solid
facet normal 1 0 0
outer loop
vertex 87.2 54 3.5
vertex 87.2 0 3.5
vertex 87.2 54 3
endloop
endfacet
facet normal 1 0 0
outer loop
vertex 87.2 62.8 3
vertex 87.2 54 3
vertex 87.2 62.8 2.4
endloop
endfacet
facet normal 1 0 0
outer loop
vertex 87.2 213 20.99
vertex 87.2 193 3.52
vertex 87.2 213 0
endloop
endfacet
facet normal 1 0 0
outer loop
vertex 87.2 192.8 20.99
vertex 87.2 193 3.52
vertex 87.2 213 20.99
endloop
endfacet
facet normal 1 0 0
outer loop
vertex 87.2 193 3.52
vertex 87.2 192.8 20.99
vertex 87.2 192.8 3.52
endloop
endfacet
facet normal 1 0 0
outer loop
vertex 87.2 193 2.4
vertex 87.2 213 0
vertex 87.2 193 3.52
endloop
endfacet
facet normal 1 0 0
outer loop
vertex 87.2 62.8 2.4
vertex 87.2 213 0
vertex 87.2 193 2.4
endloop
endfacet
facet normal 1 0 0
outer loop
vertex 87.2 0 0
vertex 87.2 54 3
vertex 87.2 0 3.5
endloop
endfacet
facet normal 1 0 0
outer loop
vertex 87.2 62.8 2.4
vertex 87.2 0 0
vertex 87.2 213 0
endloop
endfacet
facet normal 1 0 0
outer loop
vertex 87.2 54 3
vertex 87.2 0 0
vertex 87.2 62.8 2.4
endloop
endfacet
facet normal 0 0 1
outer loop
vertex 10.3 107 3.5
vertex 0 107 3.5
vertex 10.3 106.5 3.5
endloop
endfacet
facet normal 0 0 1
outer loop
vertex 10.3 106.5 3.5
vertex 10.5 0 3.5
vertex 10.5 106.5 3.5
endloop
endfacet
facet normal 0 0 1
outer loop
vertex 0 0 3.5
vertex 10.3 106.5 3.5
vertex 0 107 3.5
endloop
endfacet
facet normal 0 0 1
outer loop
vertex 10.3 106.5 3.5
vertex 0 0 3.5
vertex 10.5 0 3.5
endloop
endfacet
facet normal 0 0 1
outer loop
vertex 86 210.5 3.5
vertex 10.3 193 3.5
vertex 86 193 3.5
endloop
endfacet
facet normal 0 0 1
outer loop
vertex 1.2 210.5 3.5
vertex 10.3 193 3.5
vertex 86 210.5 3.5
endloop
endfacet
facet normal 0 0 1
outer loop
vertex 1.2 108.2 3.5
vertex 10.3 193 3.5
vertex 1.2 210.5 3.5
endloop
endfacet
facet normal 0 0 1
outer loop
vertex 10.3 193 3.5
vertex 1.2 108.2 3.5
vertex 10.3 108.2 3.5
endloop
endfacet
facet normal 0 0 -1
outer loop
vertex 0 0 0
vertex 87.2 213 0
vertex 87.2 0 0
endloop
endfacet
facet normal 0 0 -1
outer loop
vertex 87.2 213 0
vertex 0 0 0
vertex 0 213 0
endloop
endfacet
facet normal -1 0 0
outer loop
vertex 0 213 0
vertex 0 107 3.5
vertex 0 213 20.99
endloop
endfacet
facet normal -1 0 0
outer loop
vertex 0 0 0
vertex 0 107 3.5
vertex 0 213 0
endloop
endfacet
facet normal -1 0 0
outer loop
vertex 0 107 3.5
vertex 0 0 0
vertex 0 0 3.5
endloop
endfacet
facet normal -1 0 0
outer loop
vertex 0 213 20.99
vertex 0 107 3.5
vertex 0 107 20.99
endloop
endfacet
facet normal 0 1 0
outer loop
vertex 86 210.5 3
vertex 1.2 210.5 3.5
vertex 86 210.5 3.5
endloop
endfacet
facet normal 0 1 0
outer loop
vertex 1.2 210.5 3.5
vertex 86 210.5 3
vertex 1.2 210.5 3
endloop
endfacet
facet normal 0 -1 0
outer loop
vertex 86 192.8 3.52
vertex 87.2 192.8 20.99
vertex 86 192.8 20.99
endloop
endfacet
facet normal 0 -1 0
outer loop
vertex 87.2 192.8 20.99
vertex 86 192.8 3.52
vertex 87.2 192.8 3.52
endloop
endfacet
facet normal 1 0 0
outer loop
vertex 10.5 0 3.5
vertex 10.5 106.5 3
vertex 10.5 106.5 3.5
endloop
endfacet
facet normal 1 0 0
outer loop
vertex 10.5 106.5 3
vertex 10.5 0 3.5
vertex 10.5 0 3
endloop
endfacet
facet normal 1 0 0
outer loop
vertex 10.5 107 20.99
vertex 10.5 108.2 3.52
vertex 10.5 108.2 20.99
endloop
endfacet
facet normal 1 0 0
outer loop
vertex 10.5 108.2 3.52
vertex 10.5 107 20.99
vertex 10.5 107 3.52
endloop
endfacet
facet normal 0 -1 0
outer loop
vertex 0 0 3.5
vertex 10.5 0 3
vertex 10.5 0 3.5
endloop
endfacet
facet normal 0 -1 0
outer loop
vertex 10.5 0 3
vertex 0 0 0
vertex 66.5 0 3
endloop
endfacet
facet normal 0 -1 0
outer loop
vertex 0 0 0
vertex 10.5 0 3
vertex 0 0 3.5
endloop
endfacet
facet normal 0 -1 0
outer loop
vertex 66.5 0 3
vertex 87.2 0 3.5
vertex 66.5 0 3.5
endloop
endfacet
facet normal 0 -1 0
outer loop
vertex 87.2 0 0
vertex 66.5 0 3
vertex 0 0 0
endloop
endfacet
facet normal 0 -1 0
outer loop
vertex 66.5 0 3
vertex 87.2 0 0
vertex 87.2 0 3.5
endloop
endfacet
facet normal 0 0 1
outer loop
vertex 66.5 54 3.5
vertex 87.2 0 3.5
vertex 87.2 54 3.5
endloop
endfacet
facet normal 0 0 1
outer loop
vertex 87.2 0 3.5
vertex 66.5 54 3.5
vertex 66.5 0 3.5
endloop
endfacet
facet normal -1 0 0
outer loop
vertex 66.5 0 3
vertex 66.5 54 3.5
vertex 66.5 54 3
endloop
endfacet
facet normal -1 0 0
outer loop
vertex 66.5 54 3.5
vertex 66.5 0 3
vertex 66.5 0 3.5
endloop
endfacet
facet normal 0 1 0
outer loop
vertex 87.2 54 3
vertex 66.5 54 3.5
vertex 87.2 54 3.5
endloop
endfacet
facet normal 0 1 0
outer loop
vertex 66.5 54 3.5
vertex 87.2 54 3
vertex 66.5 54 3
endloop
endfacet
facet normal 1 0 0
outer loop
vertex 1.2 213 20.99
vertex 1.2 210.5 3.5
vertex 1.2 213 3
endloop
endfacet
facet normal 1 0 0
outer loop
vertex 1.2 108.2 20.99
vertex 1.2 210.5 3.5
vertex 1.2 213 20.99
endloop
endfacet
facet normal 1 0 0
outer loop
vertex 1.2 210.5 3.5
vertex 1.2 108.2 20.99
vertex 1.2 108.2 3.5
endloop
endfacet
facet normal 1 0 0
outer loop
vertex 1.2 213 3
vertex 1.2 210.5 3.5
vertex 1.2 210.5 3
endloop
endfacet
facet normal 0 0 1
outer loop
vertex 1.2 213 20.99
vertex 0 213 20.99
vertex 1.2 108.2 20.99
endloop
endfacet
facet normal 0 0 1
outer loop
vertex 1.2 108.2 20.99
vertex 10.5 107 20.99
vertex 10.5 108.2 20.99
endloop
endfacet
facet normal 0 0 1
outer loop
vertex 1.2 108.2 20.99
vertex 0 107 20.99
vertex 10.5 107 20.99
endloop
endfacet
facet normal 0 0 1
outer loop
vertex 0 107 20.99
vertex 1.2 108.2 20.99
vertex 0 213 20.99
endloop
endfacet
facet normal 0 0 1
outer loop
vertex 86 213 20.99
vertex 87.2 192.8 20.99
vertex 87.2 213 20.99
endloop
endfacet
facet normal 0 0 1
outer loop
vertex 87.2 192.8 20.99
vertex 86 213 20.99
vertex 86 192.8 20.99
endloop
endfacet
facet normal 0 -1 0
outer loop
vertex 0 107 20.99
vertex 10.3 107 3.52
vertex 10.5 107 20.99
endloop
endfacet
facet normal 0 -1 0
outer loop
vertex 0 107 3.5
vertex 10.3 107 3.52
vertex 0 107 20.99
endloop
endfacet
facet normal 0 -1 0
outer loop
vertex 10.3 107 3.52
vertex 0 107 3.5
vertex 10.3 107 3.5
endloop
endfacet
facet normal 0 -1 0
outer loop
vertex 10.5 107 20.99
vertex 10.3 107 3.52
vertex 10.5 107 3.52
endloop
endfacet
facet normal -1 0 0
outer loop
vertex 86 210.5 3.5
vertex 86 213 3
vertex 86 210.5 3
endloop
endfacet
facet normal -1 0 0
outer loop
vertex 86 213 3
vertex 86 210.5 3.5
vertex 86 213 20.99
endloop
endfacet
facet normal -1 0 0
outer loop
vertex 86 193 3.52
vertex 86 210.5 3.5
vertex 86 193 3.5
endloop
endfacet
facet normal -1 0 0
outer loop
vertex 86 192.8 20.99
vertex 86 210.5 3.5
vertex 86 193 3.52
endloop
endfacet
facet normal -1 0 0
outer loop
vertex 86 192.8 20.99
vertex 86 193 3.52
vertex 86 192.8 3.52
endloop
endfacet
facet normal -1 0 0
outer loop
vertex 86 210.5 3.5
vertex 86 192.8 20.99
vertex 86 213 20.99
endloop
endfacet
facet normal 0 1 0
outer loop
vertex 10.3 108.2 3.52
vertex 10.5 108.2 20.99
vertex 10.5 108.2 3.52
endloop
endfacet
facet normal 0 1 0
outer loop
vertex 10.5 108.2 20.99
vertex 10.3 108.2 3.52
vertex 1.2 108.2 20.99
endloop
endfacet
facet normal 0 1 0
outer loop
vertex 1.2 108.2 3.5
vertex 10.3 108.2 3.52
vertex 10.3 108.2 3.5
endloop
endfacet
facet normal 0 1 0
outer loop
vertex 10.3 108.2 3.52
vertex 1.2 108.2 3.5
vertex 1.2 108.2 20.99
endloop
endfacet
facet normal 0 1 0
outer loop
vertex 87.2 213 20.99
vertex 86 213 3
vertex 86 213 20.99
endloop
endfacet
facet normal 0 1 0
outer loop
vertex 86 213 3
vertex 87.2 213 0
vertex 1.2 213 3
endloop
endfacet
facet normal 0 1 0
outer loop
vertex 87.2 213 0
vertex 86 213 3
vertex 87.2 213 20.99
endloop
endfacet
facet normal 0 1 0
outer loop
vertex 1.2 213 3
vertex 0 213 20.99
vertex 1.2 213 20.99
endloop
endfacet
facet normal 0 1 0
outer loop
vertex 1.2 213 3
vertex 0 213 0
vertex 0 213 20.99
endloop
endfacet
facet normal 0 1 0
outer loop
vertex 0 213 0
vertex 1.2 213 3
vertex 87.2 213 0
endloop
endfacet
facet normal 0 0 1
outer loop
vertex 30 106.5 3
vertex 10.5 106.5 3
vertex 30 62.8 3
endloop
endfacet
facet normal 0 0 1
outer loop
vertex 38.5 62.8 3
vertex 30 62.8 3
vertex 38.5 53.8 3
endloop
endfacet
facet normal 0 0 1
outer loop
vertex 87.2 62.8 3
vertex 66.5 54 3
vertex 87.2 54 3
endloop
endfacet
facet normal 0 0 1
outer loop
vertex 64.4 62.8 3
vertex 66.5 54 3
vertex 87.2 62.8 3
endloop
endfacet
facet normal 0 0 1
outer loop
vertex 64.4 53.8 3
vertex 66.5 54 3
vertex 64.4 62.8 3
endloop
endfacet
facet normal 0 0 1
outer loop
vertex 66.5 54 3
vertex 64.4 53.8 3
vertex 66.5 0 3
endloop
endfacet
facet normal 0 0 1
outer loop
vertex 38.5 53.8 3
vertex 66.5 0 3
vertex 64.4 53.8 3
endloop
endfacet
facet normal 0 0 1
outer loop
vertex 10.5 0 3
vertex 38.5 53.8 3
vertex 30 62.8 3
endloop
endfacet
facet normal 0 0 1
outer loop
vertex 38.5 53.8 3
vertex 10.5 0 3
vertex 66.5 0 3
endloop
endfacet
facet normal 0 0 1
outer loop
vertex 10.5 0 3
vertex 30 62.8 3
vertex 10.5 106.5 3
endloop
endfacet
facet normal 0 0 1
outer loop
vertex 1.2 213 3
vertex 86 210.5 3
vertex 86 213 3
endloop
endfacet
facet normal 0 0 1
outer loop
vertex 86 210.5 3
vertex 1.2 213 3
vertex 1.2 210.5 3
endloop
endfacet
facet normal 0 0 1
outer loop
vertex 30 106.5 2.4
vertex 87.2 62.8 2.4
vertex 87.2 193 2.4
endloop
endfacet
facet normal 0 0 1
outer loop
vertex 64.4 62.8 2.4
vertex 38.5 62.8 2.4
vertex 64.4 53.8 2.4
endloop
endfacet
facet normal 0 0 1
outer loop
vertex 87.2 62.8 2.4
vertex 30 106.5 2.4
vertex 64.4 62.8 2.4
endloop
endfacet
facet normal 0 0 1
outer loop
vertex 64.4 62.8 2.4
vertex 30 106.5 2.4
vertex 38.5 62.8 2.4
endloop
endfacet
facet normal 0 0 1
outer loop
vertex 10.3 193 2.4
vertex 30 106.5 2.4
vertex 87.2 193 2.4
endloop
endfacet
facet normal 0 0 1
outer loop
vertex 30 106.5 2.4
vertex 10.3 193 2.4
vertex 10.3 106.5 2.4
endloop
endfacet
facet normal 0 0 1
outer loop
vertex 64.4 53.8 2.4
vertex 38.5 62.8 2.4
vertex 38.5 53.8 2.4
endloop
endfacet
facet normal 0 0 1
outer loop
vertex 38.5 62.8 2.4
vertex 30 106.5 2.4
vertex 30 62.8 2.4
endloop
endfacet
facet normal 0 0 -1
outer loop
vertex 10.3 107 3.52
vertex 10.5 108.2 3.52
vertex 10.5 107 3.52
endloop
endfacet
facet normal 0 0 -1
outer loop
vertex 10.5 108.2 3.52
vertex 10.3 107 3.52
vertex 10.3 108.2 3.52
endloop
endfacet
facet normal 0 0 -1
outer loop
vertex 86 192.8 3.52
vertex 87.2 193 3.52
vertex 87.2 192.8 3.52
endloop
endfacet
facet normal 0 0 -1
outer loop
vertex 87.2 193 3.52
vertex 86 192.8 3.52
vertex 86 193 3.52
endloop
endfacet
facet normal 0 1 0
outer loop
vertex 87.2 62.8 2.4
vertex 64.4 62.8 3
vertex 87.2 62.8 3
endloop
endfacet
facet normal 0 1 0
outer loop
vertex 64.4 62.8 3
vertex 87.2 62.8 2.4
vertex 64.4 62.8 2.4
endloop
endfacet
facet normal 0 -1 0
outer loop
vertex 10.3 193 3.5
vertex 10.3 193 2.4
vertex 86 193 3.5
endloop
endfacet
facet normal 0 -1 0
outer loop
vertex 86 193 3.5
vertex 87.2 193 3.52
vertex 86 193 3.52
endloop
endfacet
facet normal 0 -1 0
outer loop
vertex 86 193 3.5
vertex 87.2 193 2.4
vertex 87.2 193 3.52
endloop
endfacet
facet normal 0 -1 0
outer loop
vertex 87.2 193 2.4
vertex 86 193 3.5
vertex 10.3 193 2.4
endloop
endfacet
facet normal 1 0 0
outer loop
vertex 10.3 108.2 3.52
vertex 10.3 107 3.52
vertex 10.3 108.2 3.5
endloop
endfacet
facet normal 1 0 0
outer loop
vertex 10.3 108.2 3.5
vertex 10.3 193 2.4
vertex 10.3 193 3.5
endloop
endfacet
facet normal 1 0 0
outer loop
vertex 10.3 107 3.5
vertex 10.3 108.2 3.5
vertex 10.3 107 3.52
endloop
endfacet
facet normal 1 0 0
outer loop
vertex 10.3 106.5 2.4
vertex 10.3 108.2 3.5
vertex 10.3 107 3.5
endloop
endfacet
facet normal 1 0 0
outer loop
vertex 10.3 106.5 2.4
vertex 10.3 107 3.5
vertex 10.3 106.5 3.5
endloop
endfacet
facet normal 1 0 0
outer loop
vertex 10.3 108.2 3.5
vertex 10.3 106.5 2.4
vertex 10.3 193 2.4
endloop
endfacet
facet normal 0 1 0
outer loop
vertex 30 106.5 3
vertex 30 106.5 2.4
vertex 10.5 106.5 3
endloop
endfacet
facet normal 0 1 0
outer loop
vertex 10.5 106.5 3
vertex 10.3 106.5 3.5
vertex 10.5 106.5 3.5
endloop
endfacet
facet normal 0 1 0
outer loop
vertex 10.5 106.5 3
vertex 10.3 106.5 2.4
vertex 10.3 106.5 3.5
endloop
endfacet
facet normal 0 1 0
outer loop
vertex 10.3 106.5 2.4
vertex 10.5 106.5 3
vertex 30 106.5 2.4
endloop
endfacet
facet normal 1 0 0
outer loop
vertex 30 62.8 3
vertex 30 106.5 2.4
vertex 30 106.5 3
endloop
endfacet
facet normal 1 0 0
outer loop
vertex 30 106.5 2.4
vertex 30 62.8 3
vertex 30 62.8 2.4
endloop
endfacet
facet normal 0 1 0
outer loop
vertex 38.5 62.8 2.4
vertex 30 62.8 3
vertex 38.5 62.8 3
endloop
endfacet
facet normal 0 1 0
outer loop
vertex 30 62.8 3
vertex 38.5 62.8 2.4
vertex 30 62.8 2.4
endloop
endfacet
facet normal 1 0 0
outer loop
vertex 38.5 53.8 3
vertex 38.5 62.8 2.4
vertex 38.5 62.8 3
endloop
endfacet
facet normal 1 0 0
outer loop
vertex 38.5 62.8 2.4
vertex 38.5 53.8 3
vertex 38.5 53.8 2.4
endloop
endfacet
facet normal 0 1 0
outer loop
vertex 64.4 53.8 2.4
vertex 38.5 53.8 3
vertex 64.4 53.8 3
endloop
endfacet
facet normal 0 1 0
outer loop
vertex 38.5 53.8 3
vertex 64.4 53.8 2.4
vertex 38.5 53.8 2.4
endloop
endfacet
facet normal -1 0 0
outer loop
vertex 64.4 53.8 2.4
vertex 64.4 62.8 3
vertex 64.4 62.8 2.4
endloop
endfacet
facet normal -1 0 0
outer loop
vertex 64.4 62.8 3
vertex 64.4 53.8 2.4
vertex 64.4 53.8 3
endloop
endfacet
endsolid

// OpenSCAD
// file: _home_model.scad
// =====================================
// Home massing model
// 1:100 printable massing model of a two-storey semi with rear and side
// extensions, its plot and the garden room, from the architect's 1:50
// drawings. All figures below are real millimetres.
// =====================================
// Parts:
//   home_house        -> home_house.stl        house, roofs, bay, canopy, chimney
//   home_garden_room  -> home_garden_room.stl  L-shaped shower/office/workshop
//   home_site_front   -> home_site_front.stl   front plot tile (Y up to 15000)
//   home_site_rear    -> home_site_rear.stl    rear plot tile (Y from 15000)
//   home_assembly     -> home_assembly.stl     viewing aid, not a printable part
//
// Site frame: X east (party wall side), Y towards the rear garden, Z up;
// X = 0 at the west face of the rear extension, Y = 0 at the main house
// front face. scale_denominator divides everything at the end.

$fn = 64;

scale_denominator = 100;
s = 1 / scale_denominator;

// Print-size features (printed mm x scale_denominator)
base_t    = 3   * scale_denominator;
recess_d  = 0.6 * scale_denominator;
relief_h  = 0.5 * scale_denominator;
opening_d = 0.5 * scale_denominator;
fence_t   = 1.2 * scale_denominator;
fit_clear = 0.2 * scale_denominator;
eps = 1;

// Plot
plot_x0 = -1050;  plot_x1 =  7670;  plot_y0 = -6300;  plot_y1 = 31200;
tile_split_y = 15000;
patio_y0 = 12980;  patio_y1 = 14750;  drive_x0 = 5600;
fence_h  = 1800;  fence_y0 = 4400;  east_fence_y0 = 12980;

// Main house
main_x0 = 1970;  main_x1 = 7670;  main_y0 = 0;  main_y1 = 5871;
main_eaves_h = 5300;  main_ridge_h = 6700;  main_ridge_y = (main_y0 + main_y1) / 2;
front_overhang = 300;  verge_overhang = 150;
bay_x0 = 2820;  bay_x1 = 5370;  bay_proj = 900;  bay_h = 2700;
canopy_y = -1000;  canopy_z0 = 2350;  canopy_z1 = 2800;  canopy_t = 150;

// Rear extension and first-floor rear block
rear_x0 = 0;  rear_x1 = 7670;  rear_y0 = main_y1;  rear_y1 = 12980;
ff_x0 = 2150;  ff_x1 = 7670;  rear_eaves_h = 5100;  rear_ridge_h = 6400;
rear_ridge_x = (ff_x0 + ff_x1) / 2;  hip_len = (ff_x1 - ff_x0) / 2;
side_x0 = 0;  side_x1 = main_x0;  side_y0 = 4370;  side_y1 = main_y1;
flat_h = 3100;
chim_x0 = 1870;  chim_x1 = 2370;  chim_y0 = 3250;  chim_y1 = 3750;  chim_h = 7500;
pot_d = 250;  pot_h = 300;
rooflight_x0 = 800;  rooflight_x1 = 1550;  rooflight_y = [7900, 9700];  rooflight_l = 1000;  rooflight_d = 50;

// Garden room
gr_x0 = -280;  gr_x1 = 7320;  gr_y1 = 30855;  gr_north_y0 = gr_y1 - 3400;
gr_west_x1 = 3020;  gr_west_y0 = gr_north_y0 - 3200;
gr_wall_h = 2530;  gr_roof_t = 250;  gr_h = gr_wall_h + gr_roof_t;
cov_x1 = 3420;  cov_y0 = gr_west_y0 - 5000;
post_w = 150;  low_wall_t = 215;  low_wall_h = 750;

module box(x0, x1, y0, y1, z0, z1) { translate([x0, y0, z0]) cube([x1 - x0, y1 - y0, z1 - z0]); }
module cut_south(y, x0, x1, z0, z1) { box(x0, x1, y - eps, y + opening_d, z0 - eps, z1); }
module cut_north(y, x0, x1, z0, z1) { box(x0, x1, y - opening_d, y + eps, z0 - eps, z1); }
module cut_west(x, y0, y1, z0, z1)  { box(x - eps, x + opening_d, y0, y1, z0 - eps, z1); }
module cut_east(x, y0, y1, z0, z1)  { box(x - opening_d, x + eps, y0, y1, z0 - eps, z1); }
module yz_prism(x0, x1, pts) { translate([x0, 0, 0]) rotate([90, 0, 90]) linear_extrude(x1 - x0) polygon(pts); }

module main_roof() {
    k = (main_ridge_h - main_eaves_h) / (main_ridge_y - main_y0);
    yz_prism(main_x0 - verge_overhang, main_x1, [
        [main_y0 - front_overhang, main_eaves_h - front_overhang * k],
        [main_ridge_y, main_ridge_h], [main_y1, main_eaves_h]]);
}
// Hip prism starts under the main ridge so the union forms the valleys.
module rear_roof() {
    hull() {
        box(ff_x0, ff_x1, main_ridge_y, rear_y1, rear_eaves_h - eps, rear_eaves_h);
        box(rear_ridge_x - 1, rear_ridge_x + 1, main_ridge_y, rear_y1 - hip_len, rear_ridge_h - 1, rear_ridge_h);
    }
}
module canopy() {
    yz_prism(bay_x0, main_x1, [[canopy_y, canopy_z0], [eps, canopy_z1],
        [eps, canopy_z1 - canopy_t], [canopy_y, canopy_z0 - canopy_t]]);
}
module chimney() {
    box(chim_x0, chim_x1, chim_y0, chim_y1, 0, chim_h);
    for (x = [chim_x0 + 125, chim_x1 - 125])
        translate([x, (chim_y0 + chim_y1) / 2, chim_h - eps]) cylinder(d = pot_d, h = pot_h + eps);
}
module house_real() {
    difference() {
        union() {
            box(main_x0, main_x1, main_y0, main_y1, 0, main_eaves_h);
            box(rear_x0, rear_x1, rear_y0 - eps, rear_y1, 0, flat_h);
            box(ff_x0, ff_x1, rear_y0 - eps, rear_y1, 0, rear_eaves_h);
            box(side_x0, side_x1 + eps, side_y0, side_y1 + eps, 0, flat_h);
            box(bay_x0, bay_x1, -bay_proj, eps, 0, bay_h);
            main_roof(); rear_roof(); canopy(); chimney();
        }
        cut_south(-bay_proj, 3020, 5170, 800, 2280);      // bay window
        cut_south(main_y0, 5960, 7310, 0, 2180);          // front door + side light
        cut_south(main_y0, 2861, 4570, 3261, 4731);       // FF window west
        cut_south(main_y0, 5971, 6560, 3331, 4731);       // FF window over door
        cut_south(side_y0, 1000, 1900, 0, 2280);          // side extension door
        cut_west(rear_x0, 5900, 6800, 0, 2080);           // kitchen strip door
        cut_west(main_x0, 4800, 5700, flat_h + 50, 4810); // FF escape window
        cut_west(ff_x0, 6865, 7764, 3932, 4682);          // bath
        cut_west(ff_x0, 8456, 9055, 3932, 4682);          // en-suite
        cut_north(rear_y1, 1302, 6811, 180, 2280);        // sliding doors
        cut_north(rear_y1, 5151, 6871, 3512, 4862);       // principal bed window
        cut_north(rear_y1, 3202, 3782, 3512, 4862);       // dressing window
        for (y = rooflight_y) box(rooflight_x0, rooflight_x1, y, y + rooflight_l, flat_h - rooflight_d, flat_h + eps);
    }
}
module garden_room_real() {
    difference() {
        union() {
            box(gr_x0, gr_x1, gr_north_y0, gr_y1, 0, gr_h);
            box(gr_x0, gr_west_x1, gr_west_y0, gr_north_y0 + eps, 0, gr_h);
            box(gr_x0, cov_x1, cov_y0, gr_west_y0 + eps, gr_wall_h, gr_h);
            for (x = [gr_x0, cov_x1 - post_w], y = [cov_y0, (cov_y0 + gr_west_y0) / 2])
                box(x, x + post_w, y, y + post_w, 0, gr_wall_h + eps);
            box(gr_x0, gr_x0 + low_wall_t, cov_y0, gr_west_y0 + eps, 0, low_wall_h);
        }
        cut_south(gr_west_y0, 1020, 2620, 0, 2100);   // office doors to covered area
        cut_south(gr_north_y0, 4600, 6730, 0, 2100);  // workshop double door
        cut_east(gr_west_x1, 24355, 25155, 0, 2100);  // office door
        cut_east(gr_west_x1, 25255, 26555, 950, 2200);// office window
        cut_west(gr_x0, 29455, 30055, 1500, 2200);    // shower window
    }
}
module house_footprint_2d() {
    translate([main_x0, main_y0]) square([main_x1 - main_x0, main_y1 - main_y0]);
    translate([bay_x0, -bay_proj]) square([bay_x1 - bay_x0, bay_proj + eps]);
    translate([rear_x0, rear_y0 - eps]) square([rear_x1 - rear_x0, rear_y1 - rear_y0 + eps]);
    translate([side_x0, side_y0]) square([side_x1 - side_x0 + eps, side_y1 - side_y0 + eps]);
}
module garden_room_footprint_2d() {
    translate([gr_x0, gr_north_y0]) square([gr_x1 - gr_x0, gr_y1 - gr_north_y0]);
    translate([gr_x0, gr_west_y0]) square([gr_west_x1 - gr_x0, gr_north_y0 - gr_west_y0 + eps]);
    translate([gr_x0, cov_y0]) square([cov_x1 - gr_x0, gr_west_y0 - cov_y0 + eps]);
}
module fences() {
    box(plot_x0, plot_x0 + fence_t, fence_y0, plot_y1, 0, fence_h);
    box(plot_x1 - fence_t, plot_x1, east_fence_y0, plot_y1, 0, fence_h);
    box(plot_x0, plot_x1, plot_y1 - fence_t, plot_y1, 0, fence_h);
    box(plot_x0, 0, fence_y0, fence_y0 + fence_t, 0, fence_h);
}
module relief() {
    box(plot_x0, plot_x1, patio_y0, patio_y1, 0, base_t + relief_h);
    box(plot_x0, 0, plot_y0, rear_y1, 0, base_t + relief_h);
    box(drive_x0, plot_x1, plot_y0, -bay_proj, 0, base_t + relief_h);
}
module tile_real(y0, y1) {
    difference() {
        union() {
            box(plot_x0, plot_x1, y0, y1, 0, base_t);
            intersection() { box(plot_x0, plot_x1, y0, y1, 0, base_t + relief_h + eps); relief(); }
            intersection() { box(plot_x0, plot_x1, y0, y1, 0, base_t + fence_h + eps); translate([0, 0, base_t - eps]) fences(); }
        }
        translate([0, 0, base_t - recess_d]) linear_extrude(recess_d + relief_h + 2 * eps)
            offset(delta = fit_clear) { house_footprint_2d(); garden_room_footprint_2d(); }
    }
}
module site_front_real() { tile_real(plot_y0, tile_split_y); }
module site_rear_real()  { tile_real(tile_split_y, plot_y1); }
module home_assembly_real() {
    site_front_real(); site_rear_real();
    translate([0, 0, base_t - recess_d]) { house_real(); garden_room_real(); }
}
// main file
include <_home_model.scad>

scale(s) translate([-plot_x0, -plot_y0, 0]) site_front_real();
